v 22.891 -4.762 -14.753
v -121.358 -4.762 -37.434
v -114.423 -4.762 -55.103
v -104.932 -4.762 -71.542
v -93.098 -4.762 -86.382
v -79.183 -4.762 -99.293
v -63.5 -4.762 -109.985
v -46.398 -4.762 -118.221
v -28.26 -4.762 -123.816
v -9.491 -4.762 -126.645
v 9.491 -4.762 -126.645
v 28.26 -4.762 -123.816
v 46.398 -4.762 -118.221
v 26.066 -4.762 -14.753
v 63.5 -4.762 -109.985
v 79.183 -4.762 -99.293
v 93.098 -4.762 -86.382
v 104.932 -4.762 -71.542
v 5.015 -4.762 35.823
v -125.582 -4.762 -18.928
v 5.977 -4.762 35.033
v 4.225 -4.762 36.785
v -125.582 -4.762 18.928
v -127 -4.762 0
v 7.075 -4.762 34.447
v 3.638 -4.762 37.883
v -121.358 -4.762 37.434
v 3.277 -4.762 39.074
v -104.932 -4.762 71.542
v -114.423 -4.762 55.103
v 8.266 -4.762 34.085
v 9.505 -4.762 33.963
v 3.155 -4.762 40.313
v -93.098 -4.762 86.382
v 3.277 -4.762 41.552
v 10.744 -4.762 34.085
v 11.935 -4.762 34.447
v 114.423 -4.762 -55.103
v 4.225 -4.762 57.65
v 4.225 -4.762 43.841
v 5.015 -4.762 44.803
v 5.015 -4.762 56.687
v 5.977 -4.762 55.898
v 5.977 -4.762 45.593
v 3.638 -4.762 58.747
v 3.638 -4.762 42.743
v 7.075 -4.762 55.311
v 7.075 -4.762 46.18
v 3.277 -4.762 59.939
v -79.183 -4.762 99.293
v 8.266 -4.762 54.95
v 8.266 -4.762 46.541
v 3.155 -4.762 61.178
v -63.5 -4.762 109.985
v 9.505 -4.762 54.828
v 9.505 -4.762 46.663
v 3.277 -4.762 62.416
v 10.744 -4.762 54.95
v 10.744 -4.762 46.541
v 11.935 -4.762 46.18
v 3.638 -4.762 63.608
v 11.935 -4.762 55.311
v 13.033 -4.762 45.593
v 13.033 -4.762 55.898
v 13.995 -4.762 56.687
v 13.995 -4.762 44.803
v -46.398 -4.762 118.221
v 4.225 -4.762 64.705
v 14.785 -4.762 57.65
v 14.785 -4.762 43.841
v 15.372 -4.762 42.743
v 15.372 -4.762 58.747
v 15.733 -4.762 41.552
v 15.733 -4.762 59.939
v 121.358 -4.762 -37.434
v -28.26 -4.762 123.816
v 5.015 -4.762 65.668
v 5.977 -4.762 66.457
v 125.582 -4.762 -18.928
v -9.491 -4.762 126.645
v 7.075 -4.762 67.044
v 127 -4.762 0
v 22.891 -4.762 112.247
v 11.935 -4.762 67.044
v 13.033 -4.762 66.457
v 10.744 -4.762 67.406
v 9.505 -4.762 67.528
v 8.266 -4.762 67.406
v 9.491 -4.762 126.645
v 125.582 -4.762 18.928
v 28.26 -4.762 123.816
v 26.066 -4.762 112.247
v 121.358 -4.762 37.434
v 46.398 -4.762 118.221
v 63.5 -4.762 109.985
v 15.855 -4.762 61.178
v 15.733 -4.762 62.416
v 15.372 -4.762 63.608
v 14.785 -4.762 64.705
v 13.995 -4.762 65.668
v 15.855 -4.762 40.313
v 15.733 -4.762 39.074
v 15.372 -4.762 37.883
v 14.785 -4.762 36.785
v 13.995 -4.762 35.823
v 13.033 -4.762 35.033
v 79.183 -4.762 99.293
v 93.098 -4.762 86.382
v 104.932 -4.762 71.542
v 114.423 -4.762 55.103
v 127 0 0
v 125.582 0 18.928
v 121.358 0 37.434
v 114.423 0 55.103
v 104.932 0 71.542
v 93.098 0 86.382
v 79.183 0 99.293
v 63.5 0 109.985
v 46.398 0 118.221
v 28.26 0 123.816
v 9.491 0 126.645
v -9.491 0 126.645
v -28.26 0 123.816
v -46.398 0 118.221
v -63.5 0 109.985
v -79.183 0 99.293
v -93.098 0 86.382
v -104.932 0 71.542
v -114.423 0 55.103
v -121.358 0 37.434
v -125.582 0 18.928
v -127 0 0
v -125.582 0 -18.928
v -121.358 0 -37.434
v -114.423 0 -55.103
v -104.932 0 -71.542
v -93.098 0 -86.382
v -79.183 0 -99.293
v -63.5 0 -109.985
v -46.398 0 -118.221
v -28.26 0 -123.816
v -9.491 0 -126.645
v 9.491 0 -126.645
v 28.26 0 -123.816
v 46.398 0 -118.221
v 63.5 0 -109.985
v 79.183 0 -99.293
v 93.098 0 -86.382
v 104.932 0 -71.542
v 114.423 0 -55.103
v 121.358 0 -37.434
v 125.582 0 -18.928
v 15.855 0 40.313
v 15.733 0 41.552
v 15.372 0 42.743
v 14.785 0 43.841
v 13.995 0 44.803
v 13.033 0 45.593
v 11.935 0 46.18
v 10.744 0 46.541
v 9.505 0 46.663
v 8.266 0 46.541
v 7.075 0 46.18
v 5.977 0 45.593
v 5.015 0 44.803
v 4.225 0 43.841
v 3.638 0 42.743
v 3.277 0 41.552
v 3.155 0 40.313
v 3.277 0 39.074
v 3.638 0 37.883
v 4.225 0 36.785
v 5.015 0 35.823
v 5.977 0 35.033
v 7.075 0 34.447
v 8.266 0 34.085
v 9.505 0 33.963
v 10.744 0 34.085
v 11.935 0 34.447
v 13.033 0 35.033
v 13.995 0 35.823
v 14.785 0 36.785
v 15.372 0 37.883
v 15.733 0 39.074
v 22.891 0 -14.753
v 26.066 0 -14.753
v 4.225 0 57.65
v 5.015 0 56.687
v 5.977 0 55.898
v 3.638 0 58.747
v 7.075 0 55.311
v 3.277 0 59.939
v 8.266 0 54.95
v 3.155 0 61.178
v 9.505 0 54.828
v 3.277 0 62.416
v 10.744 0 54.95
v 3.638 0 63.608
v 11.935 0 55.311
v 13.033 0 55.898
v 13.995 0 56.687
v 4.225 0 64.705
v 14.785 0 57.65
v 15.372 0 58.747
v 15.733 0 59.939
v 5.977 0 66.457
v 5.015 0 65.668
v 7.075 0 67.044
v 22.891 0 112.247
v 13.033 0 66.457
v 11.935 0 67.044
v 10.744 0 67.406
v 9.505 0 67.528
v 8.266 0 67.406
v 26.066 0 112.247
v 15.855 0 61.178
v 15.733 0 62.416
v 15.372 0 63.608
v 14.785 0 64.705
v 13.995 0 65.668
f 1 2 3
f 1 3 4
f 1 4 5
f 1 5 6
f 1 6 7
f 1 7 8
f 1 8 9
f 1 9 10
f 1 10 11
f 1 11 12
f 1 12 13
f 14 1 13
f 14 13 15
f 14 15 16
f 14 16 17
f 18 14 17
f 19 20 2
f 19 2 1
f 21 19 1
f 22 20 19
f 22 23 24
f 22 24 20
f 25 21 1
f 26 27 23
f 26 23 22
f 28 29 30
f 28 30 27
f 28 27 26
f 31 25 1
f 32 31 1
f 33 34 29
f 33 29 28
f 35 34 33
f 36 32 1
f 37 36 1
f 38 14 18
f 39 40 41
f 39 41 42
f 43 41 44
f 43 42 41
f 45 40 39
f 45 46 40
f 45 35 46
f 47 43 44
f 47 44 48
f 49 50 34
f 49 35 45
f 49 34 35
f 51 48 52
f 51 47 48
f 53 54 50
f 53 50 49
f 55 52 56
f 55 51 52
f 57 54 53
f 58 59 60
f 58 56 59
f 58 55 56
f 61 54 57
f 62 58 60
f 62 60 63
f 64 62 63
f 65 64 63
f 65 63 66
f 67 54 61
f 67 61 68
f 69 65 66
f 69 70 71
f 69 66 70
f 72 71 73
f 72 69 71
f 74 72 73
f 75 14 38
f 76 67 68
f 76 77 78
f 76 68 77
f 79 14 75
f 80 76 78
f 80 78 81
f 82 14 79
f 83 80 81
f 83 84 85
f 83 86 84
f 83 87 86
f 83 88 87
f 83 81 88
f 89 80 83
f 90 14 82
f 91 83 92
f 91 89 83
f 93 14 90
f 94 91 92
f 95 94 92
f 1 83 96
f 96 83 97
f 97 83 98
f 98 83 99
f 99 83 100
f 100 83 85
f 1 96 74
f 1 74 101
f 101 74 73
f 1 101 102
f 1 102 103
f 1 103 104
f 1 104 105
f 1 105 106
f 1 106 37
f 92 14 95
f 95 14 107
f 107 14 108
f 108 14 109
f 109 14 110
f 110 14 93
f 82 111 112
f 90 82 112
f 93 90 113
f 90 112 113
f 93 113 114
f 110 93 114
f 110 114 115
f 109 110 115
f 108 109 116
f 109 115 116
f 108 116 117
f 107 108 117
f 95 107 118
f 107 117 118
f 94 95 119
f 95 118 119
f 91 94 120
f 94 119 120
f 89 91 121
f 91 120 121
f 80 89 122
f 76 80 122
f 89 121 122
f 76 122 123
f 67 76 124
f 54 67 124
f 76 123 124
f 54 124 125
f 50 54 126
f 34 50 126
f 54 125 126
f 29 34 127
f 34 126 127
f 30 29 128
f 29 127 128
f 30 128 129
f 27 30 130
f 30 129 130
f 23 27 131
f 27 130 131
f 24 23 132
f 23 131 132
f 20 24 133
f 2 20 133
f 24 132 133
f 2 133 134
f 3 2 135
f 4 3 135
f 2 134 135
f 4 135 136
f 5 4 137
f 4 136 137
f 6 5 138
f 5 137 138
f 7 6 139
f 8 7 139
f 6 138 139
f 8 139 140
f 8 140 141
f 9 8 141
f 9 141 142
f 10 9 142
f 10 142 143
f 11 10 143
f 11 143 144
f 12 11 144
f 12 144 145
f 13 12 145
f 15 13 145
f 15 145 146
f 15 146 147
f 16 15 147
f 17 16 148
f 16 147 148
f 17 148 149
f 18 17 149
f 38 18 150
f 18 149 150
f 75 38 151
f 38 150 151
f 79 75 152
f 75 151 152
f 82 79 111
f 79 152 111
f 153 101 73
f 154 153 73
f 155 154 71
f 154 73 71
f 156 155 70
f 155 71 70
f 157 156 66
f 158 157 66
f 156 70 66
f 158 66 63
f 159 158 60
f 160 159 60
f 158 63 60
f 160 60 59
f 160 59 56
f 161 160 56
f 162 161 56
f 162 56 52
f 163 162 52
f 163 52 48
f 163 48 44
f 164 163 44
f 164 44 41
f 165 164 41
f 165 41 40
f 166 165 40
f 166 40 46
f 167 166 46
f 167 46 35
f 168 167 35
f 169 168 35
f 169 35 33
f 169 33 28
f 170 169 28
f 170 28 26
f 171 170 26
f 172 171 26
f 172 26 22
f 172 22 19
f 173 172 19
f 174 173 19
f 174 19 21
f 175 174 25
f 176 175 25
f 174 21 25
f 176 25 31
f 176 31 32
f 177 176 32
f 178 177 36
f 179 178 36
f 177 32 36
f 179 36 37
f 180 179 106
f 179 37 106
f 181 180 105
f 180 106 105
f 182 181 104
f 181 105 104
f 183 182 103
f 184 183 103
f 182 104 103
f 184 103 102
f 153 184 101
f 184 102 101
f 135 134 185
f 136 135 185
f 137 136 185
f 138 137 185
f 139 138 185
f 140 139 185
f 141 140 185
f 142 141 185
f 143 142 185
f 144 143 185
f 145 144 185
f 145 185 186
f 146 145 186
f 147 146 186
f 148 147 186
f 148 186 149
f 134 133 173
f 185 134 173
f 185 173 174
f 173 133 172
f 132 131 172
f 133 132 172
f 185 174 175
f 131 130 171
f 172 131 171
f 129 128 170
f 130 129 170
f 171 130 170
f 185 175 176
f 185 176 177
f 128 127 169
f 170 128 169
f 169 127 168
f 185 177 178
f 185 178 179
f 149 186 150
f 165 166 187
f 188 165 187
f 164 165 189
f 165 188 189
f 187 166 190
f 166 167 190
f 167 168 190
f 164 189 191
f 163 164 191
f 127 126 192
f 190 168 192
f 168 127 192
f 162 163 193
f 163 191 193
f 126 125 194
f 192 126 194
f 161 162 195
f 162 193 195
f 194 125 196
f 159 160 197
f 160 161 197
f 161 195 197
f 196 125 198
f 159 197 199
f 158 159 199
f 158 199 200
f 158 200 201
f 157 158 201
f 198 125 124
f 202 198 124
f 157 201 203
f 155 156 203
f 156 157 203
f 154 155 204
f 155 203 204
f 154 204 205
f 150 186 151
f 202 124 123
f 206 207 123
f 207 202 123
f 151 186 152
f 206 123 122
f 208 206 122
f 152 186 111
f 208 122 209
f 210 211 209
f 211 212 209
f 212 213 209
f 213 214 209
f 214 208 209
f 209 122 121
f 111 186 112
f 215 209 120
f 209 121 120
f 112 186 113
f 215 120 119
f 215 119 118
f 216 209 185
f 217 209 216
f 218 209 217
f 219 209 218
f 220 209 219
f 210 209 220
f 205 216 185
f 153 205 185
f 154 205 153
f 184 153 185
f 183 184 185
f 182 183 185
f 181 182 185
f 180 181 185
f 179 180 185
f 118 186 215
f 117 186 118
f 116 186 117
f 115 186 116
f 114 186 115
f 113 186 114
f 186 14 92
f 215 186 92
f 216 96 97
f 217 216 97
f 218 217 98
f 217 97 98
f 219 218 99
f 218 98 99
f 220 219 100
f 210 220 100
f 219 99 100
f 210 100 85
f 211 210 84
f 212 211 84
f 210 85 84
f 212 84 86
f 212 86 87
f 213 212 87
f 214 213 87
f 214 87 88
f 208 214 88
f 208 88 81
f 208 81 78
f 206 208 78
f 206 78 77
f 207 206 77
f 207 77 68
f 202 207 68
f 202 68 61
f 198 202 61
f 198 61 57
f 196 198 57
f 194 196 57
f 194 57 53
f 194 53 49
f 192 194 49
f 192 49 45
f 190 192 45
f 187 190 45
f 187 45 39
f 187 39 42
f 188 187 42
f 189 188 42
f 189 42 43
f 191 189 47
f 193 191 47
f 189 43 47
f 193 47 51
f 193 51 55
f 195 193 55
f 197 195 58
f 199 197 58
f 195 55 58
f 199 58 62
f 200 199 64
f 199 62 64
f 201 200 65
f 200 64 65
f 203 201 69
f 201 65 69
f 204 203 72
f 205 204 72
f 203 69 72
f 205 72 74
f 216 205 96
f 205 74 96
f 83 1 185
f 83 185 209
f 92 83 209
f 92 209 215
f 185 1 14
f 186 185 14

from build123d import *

# Parameters (mm, degrees)
F0_R     = 127
F1_DEPTH = 4.7625
F2_W     = 12.7
F2_H     = 76.2
F3_DEPTH = 25.4
F4_SIZE  = 5.08
F5_R     = 6.35
F6_DEPTH = 4.7635
F7_W     = 3.175
F7_H     = 127
F8_DEPTH = 4.7635


with BuildPart() as f1:
    # F0 (on Front) → F1 (new body)
    with BuildSketch(Plane.XZ):
        Circle(F0_R)
    extrude(amount=F1_DEPTH)

    # F5 (on face) → F6 (cut, through all)
    with BuildSketch(Plane.XZ.offset(4.7625)):
        with Locations((9.505124, 61.177523)):
            Circle(F5_R)
        with Locations((9.505124, 40.313245)):
            Circle(F5_R)
    extrude(amount=-F6_DEPTH, mode=Mode.SUBTRACT)

    # F7 (on face) → F8 (cut, through all)
    with BuildSketch(Plane.XZ.offset(4.7625)):
        with Locations((24.478537, 48.747311)):
            Rectangle(F7_W, F7_H)
    extrude(amount=-F8_DEPTH, mode=Mode.SUBTRACT)


with BuildPart() as f3:
    # F2 (on face) → F3 (new body)
    with BuildSketch(Plane.XZ.offset(4.7625)):
        with Locations((-221.724585, -33.983209)):
            Rectangle(F2_W, F2_H)
    extrude(amount=F3_DEPTH)

    # F4
    f4_edges = [f3.edges().sort_by_distance(p)[0] for p in [
        (-228.074585, -30.1625, -33.983209),
        (-215.374585, -30.1625, -33.983209),
        (-221.724585, -30.1625, 4.116791),
        (-221.724585, -30.1625, -72.083209),
    ]]
    chamfer(f4_edges, length=F4_SIZE)


solid = f1.part
